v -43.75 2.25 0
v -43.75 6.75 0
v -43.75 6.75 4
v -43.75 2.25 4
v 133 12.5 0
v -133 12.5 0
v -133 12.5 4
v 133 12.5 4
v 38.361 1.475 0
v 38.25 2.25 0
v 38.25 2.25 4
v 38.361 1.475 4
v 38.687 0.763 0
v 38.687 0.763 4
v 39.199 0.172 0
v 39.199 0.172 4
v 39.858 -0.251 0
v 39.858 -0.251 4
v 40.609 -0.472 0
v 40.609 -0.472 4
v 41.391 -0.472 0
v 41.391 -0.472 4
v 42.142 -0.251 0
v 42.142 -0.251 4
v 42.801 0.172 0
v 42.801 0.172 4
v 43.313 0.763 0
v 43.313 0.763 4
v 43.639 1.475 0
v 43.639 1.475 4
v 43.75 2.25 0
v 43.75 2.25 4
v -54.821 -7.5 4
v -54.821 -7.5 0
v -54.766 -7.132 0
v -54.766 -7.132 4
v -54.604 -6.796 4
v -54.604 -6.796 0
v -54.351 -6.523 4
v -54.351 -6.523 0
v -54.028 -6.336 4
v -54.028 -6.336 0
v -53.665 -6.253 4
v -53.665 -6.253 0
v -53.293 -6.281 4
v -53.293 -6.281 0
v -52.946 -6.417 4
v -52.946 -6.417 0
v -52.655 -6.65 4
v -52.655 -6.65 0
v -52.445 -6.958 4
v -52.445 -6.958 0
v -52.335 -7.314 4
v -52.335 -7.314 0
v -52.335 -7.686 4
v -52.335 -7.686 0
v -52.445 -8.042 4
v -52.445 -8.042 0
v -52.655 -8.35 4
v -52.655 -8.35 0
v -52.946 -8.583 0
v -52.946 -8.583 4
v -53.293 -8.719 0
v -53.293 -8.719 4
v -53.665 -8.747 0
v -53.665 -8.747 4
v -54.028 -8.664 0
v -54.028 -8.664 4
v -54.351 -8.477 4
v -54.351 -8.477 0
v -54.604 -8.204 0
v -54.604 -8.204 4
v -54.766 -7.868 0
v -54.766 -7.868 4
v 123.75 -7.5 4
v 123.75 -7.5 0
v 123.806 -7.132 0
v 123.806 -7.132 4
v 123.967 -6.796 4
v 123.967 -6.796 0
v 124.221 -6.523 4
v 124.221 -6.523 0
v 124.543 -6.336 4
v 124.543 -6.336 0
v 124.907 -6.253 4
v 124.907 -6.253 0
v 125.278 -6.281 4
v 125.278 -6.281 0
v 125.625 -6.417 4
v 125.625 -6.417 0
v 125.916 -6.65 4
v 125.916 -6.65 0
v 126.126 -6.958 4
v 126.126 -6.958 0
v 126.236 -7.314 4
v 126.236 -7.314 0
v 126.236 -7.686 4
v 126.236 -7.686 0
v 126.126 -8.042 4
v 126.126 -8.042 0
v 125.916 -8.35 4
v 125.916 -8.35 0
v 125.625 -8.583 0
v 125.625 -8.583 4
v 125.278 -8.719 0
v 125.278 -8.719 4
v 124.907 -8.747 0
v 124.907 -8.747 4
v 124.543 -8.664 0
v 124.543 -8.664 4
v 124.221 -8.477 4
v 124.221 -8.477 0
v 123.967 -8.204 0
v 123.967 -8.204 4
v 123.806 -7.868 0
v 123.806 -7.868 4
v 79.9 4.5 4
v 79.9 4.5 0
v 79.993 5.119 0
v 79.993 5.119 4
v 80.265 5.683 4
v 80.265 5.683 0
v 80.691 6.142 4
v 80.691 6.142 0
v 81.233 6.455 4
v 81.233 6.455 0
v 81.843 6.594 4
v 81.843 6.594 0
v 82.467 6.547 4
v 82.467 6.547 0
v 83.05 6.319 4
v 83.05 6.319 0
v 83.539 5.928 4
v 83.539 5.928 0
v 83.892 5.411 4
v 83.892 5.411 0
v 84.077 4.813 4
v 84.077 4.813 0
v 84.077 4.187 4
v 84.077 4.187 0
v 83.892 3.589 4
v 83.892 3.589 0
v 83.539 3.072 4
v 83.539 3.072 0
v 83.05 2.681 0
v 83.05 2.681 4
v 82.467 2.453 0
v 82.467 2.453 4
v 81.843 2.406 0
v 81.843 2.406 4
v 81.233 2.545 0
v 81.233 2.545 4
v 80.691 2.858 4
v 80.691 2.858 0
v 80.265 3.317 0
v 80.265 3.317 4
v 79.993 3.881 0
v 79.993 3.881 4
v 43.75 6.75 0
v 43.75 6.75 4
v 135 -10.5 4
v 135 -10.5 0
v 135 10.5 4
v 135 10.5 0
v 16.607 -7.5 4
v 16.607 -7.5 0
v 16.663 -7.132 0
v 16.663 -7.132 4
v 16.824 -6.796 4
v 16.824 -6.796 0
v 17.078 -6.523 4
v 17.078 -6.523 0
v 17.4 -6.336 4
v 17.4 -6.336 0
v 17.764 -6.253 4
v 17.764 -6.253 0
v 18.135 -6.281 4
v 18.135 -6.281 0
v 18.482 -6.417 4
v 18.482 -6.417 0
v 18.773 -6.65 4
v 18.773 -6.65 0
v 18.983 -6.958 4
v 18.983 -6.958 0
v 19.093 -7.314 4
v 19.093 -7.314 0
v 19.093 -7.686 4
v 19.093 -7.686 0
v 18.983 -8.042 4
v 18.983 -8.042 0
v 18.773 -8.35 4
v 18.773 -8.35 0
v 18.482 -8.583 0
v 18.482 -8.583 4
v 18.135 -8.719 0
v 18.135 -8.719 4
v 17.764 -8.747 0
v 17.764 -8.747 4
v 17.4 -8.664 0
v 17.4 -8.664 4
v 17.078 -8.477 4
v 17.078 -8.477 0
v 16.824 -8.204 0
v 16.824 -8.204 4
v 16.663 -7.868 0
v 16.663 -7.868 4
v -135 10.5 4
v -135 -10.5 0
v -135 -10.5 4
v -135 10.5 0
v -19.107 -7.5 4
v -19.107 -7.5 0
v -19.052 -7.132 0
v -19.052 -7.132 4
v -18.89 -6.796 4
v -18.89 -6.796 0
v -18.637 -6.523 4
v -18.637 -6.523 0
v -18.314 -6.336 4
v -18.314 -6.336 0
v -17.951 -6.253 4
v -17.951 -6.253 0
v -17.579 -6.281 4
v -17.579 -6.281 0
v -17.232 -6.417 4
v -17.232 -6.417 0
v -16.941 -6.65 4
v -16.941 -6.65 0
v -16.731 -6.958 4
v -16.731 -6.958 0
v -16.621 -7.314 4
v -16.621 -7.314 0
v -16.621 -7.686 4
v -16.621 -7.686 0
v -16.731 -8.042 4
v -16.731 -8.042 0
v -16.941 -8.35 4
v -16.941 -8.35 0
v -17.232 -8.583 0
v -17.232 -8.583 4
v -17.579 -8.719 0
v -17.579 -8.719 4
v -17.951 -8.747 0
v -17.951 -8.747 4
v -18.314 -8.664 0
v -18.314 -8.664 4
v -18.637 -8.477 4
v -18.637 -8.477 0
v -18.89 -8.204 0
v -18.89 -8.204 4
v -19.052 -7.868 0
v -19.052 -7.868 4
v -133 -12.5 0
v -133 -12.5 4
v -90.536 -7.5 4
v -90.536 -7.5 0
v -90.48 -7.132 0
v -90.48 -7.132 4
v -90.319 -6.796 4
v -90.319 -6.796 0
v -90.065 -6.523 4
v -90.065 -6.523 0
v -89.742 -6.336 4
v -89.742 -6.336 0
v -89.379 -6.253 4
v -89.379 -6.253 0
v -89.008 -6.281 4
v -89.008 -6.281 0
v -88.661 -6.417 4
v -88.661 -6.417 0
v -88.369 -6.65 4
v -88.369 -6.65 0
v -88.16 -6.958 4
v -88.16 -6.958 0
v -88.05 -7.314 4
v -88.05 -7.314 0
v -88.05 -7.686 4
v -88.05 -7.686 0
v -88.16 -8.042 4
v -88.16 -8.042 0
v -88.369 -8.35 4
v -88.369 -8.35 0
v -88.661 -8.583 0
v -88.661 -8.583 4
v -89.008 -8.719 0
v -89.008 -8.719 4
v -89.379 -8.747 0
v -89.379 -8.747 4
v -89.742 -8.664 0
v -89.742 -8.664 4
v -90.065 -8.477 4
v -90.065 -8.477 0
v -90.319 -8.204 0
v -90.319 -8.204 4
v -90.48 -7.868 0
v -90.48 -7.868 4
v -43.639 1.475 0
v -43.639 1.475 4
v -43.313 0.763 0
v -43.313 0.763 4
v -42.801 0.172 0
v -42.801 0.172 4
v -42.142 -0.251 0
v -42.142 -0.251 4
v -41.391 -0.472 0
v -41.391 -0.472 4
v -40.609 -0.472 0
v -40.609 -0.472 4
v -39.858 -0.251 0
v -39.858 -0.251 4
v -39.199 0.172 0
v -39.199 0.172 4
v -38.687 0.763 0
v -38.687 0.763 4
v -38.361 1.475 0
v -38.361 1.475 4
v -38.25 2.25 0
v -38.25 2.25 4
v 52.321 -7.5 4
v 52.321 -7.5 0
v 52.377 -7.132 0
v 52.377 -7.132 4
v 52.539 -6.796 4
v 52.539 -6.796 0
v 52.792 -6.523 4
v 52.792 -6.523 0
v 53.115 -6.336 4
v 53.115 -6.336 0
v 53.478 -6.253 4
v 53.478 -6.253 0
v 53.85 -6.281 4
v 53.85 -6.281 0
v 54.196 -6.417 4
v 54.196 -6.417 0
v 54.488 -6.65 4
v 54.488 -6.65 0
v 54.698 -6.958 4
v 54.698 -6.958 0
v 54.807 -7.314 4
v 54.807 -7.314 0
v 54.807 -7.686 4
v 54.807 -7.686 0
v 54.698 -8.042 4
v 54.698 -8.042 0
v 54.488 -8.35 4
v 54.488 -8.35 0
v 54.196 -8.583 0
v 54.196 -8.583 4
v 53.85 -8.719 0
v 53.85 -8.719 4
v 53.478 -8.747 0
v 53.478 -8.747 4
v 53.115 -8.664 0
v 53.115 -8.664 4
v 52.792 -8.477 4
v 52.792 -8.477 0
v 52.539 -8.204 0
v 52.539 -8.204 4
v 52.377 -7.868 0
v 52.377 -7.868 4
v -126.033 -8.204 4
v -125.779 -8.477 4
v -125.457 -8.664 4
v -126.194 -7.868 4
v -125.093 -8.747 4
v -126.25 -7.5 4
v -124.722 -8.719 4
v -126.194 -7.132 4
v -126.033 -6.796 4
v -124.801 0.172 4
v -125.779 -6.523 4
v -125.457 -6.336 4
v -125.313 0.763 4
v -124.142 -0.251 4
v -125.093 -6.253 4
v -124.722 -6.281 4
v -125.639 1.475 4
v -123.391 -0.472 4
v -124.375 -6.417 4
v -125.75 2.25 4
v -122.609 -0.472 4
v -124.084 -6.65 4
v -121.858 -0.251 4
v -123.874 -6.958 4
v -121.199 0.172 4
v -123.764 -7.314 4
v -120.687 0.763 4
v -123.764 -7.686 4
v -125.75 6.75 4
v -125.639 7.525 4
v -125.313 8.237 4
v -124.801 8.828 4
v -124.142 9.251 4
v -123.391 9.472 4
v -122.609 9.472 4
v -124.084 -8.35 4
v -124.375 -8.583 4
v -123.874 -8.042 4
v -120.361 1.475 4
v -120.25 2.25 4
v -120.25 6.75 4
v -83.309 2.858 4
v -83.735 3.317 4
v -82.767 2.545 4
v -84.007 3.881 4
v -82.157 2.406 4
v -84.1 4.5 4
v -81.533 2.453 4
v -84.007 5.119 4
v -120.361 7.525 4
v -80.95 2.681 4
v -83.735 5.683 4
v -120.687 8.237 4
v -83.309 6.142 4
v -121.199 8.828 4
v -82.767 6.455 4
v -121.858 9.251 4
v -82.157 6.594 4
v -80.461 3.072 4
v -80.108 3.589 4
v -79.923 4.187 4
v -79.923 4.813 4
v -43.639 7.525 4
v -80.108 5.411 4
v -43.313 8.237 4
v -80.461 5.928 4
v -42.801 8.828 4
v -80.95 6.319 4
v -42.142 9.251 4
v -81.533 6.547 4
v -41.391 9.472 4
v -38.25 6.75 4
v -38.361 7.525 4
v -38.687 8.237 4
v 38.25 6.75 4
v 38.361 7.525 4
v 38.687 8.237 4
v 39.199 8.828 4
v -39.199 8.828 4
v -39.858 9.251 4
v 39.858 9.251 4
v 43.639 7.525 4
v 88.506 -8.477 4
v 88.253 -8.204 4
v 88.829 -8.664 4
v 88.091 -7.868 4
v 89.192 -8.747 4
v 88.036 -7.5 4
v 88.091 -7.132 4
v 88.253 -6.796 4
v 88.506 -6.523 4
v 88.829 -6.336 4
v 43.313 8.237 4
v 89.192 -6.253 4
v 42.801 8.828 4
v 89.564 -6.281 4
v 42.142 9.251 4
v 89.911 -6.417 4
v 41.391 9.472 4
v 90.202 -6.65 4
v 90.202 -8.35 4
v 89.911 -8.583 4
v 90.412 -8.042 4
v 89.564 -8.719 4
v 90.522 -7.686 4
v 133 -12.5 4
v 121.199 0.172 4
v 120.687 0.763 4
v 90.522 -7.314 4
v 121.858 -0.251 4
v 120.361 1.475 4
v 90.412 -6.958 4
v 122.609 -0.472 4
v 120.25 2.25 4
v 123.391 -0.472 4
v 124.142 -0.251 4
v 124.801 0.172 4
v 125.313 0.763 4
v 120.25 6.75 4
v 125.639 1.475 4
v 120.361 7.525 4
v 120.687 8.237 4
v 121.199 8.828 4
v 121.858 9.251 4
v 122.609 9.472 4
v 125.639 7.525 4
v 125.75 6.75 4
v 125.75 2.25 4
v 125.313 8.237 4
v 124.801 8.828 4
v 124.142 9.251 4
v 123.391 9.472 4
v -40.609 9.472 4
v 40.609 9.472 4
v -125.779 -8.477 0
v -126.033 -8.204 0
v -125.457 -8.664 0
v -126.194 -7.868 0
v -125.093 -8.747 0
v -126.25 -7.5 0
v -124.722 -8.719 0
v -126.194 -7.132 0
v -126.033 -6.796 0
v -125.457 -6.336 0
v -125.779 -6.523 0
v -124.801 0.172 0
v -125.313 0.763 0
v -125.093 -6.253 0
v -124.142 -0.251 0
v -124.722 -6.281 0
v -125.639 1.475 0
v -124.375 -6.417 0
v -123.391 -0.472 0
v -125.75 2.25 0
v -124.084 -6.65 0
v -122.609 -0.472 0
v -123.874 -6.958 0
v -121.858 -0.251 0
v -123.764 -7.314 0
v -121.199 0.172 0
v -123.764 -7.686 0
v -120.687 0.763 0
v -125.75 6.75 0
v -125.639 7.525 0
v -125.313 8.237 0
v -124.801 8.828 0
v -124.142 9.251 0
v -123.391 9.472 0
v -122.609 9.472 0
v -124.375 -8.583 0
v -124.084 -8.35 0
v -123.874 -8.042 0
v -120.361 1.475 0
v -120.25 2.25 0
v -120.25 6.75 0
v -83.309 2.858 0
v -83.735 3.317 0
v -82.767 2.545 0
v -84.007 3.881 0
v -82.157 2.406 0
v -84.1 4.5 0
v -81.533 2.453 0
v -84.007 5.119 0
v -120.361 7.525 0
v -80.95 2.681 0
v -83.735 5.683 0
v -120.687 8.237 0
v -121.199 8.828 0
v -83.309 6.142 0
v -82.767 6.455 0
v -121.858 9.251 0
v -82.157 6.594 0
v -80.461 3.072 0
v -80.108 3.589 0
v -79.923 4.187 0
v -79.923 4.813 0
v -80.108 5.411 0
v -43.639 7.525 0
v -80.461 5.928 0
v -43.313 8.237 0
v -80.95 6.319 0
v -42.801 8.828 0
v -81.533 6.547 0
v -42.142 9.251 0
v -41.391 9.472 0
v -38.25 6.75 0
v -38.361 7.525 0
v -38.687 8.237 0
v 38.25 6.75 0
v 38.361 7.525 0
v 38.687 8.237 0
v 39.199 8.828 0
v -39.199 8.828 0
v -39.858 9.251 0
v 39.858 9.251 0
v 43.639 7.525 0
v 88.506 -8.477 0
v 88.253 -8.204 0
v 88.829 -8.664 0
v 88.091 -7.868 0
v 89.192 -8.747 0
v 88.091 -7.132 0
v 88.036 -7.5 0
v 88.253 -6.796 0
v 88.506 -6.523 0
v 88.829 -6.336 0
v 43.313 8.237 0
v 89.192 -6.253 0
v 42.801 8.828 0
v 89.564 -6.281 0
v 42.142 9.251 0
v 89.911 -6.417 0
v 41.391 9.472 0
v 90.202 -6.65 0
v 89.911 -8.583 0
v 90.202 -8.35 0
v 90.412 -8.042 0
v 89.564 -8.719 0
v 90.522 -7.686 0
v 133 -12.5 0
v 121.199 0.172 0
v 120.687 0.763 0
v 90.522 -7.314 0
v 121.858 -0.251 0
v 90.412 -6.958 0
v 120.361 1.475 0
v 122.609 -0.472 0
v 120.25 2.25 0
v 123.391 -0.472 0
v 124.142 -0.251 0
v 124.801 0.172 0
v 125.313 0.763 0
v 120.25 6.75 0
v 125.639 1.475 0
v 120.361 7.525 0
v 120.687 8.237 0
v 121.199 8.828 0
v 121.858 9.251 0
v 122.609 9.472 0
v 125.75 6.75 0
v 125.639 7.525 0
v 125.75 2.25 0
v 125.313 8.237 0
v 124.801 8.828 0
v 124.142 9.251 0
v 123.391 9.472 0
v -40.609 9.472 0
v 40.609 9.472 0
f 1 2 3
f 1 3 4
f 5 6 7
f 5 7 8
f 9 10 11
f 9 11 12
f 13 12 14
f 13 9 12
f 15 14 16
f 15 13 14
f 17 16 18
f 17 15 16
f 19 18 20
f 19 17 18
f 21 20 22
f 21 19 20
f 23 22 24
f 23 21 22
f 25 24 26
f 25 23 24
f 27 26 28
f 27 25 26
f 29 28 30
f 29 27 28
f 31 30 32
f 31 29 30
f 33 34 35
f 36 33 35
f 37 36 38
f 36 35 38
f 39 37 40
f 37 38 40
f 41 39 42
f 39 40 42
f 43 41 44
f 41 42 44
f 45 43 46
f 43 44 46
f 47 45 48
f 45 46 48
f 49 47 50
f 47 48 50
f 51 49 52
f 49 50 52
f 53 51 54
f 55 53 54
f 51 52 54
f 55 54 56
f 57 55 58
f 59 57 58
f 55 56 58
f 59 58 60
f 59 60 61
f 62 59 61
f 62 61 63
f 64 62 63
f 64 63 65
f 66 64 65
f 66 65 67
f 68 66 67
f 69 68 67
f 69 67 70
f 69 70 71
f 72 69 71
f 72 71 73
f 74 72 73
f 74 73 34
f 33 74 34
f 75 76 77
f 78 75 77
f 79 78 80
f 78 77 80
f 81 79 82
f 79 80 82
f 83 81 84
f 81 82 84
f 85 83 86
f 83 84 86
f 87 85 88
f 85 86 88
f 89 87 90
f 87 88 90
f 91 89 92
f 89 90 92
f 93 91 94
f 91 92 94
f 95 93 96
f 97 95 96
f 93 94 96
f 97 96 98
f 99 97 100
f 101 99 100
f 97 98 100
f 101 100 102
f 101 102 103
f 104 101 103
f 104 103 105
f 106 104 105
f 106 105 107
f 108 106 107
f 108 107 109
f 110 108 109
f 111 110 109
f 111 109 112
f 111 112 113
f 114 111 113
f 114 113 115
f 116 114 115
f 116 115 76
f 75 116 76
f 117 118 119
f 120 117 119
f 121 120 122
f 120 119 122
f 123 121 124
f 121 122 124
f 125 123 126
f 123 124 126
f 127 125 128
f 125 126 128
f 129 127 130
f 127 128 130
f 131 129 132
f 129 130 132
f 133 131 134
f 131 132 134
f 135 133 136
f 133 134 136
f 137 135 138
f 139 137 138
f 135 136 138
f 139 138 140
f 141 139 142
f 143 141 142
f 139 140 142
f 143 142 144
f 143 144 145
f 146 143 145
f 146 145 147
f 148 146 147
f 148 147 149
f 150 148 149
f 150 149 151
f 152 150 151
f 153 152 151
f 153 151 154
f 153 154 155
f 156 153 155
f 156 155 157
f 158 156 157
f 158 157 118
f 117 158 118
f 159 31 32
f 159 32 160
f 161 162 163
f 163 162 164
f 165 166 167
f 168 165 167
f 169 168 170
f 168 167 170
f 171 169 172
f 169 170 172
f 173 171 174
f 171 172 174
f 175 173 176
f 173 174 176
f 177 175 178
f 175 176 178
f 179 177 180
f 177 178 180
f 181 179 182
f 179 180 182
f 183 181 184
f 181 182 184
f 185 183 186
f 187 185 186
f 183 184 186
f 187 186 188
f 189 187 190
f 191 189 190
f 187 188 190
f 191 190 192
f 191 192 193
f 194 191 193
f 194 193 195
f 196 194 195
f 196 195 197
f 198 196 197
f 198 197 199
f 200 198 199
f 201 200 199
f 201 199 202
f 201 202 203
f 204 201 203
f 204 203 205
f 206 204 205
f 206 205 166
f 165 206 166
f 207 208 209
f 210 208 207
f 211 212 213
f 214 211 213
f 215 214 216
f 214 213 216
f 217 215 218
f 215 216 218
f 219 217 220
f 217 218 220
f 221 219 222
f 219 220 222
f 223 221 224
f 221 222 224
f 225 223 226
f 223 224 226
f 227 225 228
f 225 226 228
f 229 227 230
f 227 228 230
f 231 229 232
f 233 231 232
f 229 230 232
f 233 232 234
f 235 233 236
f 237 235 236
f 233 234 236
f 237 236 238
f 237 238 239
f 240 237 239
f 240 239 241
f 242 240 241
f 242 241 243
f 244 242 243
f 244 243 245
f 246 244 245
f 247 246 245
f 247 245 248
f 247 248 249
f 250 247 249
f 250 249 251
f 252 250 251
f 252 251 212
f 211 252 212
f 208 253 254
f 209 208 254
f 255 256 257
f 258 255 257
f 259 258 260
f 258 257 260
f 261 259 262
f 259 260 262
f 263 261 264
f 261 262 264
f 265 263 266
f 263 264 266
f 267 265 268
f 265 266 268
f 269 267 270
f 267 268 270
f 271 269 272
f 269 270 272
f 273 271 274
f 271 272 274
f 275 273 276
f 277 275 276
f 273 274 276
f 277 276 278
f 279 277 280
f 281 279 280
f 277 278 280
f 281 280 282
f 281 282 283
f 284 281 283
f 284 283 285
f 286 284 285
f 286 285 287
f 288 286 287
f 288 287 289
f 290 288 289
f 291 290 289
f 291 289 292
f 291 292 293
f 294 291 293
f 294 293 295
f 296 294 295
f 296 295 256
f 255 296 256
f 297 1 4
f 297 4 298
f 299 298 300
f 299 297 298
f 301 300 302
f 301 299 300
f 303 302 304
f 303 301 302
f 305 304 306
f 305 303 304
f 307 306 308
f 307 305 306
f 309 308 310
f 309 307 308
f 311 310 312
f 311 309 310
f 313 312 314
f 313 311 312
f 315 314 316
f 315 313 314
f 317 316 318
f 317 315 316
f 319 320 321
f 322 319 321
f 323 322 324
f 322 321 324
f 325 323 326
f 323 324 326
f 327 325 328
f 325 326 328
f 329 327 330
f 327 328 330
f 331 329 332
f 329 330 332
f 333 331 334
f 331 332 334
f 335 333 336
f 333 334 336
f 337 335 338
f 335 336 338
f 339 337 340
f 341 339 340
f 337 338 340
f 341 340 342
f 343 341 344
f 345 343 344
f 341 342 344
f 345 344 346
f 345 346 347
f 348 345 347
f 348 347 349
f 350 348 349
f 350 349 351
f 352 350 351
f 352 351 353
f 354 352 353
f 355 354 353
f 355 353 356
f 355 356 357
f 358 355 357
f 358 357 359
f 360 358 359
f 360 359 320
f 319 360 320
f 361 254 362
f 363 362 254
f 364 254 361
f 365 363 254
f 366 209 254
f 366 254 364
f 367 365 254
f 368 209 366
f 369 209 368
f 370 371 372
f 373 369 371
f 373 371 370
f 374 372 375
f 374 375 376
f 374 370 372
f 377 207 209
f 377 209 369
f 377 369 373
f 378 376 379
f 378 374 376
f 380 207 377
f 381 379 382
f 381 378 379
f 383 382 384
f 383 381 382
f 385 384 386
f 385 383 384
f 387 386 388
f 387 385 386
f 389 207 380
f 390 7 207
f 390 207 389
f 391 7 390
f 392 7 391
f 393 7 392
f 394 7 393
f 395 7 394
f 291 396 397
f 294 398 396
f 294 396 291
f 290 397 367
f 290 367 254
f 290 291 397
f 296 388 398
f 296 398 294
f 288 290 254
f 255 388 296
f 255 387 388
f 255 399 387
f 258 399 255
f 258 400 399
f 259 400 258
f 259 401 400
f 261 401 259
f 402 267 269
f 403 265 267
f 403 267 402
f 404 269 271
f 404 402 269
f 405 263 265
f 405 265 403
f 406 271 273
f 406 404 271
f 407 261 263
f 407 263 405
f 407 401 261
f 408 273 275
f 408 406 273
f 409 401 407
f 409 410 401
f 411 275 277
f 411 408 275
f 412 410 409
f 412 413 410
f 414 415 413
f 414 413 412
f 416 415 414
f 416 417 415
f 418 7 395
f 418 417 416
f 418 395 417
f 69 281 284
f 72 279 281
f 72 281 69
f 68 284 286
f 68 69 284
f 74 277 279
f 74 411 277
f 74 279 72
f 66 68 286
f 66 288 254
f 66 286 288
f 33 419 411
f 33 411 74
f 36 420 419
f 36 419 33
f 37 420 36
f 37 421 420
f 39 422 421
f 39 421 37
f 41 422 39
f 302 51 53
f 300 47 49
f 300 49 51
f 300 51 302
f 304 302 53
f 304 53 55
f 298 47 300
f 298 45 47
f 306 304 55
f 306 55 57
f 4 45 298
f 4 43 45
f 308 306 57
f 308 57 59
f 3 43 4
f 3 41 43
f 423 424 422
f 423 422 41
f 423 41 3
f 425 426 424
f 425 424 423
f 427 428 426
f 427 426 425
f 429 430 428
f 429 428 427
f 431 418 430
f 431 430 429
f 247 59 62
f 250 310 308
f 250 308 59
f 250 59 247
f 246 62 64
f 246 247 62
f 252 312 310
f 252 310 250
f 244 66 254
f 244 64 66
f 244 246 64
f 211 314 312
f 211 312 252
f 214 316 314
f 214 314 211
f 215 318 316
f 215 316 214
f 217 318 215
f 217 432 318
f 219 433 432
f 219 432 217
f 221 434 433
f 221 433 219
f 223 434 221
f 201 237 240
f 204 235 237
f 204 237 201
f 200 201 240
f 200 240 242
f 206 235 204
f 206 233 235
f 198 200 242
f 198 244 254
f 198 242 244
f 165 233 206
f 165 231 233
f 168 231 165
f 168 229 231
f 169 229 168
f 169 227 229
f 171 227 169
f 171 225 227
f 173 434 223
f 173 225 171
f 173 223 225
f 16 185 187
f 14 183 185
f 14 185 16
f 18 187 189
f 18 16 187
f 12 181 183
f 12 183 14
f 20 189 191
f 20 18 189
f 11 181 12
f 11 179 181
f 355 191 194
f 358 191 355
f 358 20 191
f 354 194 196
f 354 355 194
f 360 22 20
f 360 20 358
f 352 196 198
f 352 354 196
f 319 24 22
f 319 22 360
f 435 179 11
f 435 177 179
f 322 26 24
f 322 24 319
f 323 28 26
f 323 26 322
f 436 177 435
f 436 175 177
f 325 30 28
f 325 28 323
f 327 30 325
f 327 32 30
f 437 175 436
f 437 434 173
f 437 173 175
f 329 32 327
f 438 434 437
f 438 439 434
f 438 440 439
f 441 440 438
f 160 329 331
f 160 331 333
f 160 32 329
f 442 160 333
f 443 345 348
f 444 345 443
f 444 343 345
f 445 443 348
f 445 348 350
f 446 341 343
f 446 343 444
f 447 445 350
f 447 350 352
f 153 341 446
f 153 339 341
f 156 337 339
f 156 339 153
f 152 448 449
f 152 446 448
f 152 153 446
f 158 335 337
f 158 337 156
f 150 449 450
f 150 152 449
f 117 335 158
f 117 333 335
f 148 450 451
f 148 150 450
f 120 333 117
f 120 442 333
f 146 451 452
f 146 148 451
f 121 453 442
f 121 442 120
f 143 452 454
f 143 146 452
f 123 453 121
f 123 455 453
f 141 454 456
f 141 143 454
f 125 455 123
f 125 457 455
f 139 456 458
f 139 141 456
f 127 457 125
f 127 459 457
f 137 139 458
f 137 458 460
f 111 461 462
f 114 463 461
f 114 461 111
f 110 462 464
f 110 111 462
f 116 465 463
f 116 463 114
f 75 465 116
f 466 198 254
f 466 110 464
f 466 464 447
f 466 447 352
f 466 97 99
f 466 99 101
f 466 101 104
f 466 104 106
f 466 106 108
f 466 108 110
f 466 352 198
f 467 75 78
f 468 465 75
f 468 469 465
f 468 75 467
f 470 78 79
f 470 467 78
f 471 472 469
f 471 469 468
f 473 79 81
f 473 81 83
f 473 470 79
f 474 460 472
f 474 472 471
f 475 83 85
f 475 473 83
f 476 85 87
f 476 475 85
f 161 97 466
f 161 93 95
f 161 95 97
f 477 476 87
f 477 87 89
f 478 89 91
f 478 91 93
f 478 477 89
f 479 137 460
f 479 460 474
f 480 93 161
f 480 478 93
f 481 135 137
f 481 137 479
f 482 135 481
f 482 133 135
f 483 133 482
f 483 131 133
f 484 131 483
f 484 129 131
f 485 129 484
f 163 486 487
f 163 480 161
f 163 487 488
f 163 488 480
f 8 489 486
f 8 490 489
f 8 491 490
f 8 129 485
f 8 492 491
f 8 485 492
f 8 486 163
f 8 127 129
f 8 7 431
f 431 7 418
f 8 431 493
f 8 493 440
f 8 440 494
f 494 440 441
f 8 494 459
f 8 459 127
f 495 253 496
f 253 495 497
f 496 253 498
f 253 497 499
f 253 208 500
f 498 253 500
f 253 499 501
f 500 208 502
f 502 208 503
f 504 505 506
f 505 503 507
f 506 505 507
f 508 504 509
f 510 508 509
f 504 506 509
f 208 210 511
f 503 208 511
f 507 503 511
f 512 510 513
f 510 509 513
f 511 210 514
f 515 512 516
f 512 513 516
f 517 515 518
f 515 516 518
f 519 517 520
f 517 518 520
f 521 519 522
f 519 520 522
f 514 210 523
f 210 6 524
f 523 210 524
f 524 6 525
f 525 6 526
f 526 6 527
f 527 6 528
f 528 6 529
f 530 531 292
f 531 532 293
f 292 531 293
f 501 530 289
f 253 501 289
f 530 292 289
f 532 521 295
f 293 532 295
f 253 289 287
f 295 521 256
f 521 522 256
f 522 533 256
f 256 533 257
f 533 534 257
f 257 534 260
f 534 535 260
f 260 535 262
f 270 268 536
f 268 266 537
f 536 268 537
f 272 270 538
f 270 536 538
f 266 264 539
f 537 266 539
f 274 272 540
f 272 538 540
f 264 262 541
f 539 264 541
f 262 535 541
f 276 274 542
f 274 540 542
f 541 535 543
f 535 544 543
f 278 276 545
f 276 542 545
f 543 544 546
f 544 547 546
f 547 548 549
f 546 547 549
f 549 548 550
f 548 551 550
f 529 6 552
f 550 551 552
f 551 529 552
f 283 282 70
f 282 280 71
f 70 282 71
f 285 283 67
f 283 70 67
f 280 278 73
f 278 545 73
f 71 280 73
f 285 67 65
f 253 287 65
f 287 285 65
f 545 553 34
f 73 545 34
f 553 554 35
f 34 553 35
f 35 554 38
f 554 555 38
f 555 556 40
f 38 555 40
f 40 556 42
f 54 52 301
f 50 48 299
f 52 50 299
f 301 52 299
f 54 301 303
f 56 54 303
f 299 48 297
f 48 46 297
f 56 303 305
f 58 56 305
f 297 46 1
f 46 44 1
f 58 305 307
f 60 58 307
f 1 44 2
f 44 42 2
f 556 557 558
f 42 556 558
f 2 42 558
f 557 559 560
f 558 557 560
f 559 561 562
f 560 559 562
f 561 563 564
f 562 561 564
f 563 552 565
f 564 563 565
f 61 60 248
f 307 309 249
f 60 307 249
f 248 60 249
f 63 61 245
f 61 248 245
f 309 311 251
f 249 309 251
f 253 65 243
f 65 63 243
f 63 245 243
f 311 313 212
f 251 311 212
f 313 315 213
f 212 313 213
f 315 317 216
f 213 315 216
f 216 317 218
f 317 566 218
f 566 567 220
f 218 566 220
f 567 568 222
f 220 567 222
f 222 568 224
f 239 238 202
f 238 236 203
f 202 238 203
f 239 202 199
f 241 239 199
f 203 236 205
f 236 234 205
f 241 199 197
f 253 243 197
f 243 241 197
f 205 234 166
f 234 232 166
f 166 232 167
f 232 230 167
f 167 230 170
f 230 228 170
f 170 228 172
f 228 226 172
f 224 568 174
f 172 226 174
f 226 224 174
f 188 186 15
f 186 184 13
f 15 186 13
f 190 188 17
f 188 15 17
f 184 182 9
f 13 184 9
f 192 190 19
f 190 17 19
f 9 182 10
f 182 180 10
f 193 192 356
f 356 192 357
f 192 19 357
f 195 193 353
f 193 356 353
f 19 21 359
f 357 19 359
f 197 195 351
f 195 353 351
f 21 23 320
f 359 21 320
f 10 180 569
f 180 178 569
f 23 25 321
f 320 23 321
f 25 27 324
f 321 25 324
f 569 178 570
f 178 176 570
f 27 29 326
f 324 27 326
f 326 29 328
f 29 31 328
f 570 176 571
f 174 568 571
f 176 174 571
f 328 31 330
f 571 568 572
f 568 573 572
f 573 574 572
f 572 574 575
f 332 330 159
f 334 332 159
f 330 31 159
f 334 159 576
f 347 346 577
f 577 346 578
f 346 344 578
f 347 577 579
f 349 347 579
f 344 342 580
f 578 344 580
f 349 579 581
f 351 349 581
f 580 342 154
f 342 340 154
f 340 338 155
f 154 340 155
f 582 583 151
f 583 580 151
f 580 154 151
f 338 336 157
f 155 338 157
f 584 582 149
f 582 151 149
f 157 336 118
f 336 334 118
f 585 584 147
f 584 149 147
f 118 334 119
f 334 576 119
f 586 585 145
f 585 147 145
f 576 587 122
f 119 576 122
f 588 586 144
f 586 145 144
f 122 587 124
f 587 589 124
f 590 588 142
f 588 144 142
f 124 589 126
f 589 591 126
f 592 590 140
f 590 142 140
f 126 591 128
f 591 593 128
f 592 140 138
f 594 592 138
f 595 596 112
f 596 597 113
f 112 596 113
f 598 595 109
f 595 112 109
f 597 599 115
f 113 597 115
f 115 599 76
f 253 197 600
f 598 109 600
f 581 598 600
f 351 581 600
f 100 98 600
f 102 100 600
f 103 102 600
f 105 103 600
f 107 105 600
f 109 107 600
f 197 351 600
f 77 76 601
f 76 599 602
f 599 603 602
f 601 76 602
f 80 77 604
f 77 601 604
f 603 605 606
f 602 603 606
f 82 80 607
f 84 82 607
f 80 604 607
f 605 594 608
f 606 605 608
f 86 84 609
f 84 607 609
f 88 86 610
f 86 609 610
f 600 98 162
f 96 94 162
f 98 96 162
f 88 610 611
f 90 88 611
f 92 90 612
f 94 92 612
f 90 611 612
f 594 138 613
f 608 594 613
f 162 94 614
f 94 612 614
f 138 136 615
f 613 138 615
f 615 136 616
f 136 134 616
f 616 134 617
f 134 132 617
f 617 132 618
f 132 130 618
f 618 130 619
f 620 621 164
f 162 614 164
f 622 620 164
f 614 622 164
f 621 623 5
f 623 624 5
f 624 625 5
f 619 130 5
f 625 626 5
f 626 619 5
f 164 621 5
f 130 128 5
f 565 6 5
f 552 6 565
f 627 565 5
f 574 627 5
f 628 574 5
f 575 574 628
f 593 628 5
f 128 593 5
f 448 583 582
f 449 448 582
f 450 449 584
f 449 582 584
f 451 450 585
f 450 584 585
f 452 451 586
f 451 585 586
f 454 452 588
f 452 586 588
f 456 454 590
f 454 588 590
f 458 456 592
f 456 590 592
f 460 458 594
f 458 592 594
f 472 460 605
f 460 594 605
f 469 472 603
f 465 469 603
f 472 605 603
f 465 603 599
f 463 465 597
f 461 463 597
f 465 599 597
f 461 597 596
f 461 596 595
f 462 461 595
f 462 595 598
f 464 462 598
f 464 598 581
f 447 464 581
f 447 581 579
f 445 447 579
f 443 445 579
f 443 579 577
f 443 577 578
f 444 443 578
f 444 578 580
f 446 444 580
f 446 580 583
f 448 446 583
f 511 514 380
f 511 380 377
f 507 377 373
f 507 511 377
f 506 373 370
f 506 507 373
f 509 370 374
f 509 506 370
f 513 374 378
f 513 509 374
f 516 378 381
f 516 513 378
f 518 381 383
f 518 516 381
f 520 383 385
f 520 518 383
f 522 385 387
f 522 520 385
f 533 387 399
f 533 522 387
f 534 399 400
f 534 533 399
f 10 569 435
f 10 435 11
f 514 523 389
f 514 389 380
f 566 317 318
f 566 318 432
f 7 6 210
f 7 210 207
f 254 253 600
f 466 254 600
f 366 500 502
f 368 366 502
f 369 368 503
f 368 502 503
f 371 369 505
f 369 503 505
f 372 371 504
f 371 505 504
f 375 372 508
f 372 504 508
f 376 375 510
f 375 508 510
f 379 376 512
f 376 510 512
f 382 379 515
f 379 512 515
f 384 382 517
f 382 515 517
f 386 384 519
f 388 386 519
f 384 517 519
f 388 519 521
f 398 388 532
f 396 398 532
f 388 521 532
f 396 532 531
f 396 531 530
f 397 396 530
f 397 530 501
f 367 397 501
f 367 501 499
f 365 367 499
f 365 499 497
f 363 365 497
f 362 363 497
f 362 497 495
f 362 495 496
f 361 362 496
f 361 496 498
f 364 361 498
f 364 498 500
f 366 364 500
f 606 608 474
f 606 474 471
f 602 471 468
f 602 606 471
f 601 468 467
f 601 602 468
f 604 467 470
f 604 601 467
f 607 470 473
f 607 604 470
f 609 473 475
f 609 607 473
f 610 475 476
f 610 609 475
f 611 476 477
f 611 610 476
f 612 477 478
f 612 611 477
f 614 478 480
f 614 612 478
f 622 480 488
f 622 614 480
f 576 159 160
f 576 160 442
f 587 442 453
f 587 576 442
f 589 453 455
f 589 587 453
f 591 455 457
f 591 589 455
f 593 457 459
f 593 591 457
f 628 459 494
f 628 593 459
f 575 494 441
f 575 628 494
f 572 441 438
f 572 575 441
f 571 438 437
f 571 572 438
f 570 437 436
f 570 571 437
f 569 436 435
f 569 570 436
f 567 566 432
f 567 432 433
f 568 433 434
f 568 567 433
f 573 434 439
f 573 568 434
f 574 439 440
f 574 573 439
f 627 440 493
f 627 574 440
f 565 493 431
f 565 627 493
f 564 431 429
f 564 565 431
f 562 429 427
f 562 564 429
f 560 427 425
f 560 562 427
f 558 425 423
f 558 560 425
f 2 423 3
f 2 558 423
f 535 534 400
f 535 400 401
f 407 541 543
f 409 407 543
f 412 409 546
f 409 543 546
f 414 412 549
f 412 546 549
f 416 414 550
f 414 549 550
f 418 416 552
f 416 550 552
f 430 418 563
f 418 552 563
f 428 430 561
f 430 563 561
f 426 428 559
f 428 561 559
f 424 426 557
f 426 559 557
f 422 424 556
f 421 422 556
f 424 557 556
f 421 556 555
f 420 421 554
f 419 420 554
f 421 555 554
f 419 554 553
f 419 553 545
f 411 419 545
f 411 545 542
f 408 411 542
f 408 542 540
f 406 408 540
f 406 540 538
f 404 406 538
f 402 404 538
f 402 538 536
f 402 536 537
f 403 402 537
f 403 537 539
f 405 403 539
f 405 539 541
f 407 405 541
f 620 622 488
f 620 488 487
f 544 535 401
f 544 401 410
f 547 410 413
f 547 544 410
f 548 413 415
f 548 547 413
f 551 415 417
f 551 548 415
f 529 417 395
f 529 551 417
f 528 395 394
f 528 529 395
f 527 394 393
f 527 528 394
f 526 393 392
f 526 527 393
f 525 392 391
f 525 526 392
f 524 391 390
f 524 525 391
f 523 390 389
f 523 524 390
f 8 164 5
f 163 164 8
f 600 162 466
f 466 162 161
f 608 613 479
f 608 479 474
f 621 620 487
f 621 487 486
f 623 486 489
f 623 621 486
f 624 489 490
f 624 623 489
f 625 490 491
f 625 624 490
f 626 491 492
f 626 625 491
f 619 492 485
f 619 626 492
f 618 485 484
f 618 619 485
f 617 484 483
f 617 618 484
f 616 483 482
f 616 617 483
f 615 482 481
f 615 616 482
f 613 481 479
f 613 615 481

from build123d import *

# Parameters (mm, degrees)
SKETCH1_W                = 270
SKETCH1_H                = 25
BOSS_EXTRUDE1_DEPTH      = 4
M5_CLEARANCE_SLOT1_DEPTH = 4
LPATTERN1_COUNT          = 4
LPATTERN1_PITCH          = 82
M3_TAPPED_HOLE1_D        = 2.5
LPATTERN2_COUNT          = 8
LPATTERN2_PITCH          = 35.714285714
CHAMFER1_SIZE            = 2
M5_TAPPED_HOLE1_D        = 4.2


# Read off the part's stored shape, not the designer's step: M5 Clearance Slot1
with BuildPart() as part:
    # Sketch1 → Boss-Extrude1 (new body)
    with BuildSketch(Plane.XY):
        Rectangle(SKETCH1_W, SKETCH1_H)
    extrude(amount=BOSS_EXTRUDE1_DEPTH)

    # M5 Clearance Slot1 outline → M5 Clearance Slot1 (cut)
    with BuildSketch(Plane.XY):
        with BuildLine():
            Line((-120.25, 2.25), (-120.25, 6.75))
            ThreePointArc((-120.25, 6.75), (-123, 9.5), (-125.75, 6.75))
            Line((-125.75, 6.75), (-125.75, 2.25))
            ThreePointArc((-125.75, 2.25), (-123, -0.5), (-120.25, 2.25))
        make_face()
    m5_clearance_slot1 = extrude(amount=M5_CLEARANCE_SLOT1_DEPTH, mode=Mode.SUBTRACT)

    # LPattern1: M5 Clearance Slot1 ×4
    with Locations(*[(i * LPATTERN1_PITCH, 0, 0) for i in range(1, LPATTERN1_COUNT)]):
        add(m5_clearance_slot1, mode=Mode.SUBTRACT)

    # M3 Tapped Hole1 (through all)
    with Locations(Plane.XY.offset(4)):
        with Locations((-125, -7.5)):
            m3_tapped_hole1 = Hole(M3_TAPPED_HOLE1_D / 2)

    # LPattern2: M3 Tapped Hole1 ×8
    with Locations(*[(i * LPATTERN2_PITCH, 0, 0) for i in range(1, LPATTERN2_COUNT)]):
        add(m3_tapped_hole1, mode=Mode.SUBTRACT)

    # Chamfer1
    chamfer1_edges = [part.edges().sort_by_distance(p)[0] for p in [
        (-135, 12.5, 2),
        (135, 12.5, 2),
        (135, -12.5, 2),
        (-135, -12.5, 2),
    ]]
    chamfer(chamfer1_edges, length=CHAMFER1_SIZE)

    # M5 Tapped Hole1 (through all)
    with Locations(Plane.XY.offset(4)):
        with Locations((82, 4.5), (-82, 4.5)):
            Hole(M5_TAPPED_HOLE1_D / 2)


solid = part.part
